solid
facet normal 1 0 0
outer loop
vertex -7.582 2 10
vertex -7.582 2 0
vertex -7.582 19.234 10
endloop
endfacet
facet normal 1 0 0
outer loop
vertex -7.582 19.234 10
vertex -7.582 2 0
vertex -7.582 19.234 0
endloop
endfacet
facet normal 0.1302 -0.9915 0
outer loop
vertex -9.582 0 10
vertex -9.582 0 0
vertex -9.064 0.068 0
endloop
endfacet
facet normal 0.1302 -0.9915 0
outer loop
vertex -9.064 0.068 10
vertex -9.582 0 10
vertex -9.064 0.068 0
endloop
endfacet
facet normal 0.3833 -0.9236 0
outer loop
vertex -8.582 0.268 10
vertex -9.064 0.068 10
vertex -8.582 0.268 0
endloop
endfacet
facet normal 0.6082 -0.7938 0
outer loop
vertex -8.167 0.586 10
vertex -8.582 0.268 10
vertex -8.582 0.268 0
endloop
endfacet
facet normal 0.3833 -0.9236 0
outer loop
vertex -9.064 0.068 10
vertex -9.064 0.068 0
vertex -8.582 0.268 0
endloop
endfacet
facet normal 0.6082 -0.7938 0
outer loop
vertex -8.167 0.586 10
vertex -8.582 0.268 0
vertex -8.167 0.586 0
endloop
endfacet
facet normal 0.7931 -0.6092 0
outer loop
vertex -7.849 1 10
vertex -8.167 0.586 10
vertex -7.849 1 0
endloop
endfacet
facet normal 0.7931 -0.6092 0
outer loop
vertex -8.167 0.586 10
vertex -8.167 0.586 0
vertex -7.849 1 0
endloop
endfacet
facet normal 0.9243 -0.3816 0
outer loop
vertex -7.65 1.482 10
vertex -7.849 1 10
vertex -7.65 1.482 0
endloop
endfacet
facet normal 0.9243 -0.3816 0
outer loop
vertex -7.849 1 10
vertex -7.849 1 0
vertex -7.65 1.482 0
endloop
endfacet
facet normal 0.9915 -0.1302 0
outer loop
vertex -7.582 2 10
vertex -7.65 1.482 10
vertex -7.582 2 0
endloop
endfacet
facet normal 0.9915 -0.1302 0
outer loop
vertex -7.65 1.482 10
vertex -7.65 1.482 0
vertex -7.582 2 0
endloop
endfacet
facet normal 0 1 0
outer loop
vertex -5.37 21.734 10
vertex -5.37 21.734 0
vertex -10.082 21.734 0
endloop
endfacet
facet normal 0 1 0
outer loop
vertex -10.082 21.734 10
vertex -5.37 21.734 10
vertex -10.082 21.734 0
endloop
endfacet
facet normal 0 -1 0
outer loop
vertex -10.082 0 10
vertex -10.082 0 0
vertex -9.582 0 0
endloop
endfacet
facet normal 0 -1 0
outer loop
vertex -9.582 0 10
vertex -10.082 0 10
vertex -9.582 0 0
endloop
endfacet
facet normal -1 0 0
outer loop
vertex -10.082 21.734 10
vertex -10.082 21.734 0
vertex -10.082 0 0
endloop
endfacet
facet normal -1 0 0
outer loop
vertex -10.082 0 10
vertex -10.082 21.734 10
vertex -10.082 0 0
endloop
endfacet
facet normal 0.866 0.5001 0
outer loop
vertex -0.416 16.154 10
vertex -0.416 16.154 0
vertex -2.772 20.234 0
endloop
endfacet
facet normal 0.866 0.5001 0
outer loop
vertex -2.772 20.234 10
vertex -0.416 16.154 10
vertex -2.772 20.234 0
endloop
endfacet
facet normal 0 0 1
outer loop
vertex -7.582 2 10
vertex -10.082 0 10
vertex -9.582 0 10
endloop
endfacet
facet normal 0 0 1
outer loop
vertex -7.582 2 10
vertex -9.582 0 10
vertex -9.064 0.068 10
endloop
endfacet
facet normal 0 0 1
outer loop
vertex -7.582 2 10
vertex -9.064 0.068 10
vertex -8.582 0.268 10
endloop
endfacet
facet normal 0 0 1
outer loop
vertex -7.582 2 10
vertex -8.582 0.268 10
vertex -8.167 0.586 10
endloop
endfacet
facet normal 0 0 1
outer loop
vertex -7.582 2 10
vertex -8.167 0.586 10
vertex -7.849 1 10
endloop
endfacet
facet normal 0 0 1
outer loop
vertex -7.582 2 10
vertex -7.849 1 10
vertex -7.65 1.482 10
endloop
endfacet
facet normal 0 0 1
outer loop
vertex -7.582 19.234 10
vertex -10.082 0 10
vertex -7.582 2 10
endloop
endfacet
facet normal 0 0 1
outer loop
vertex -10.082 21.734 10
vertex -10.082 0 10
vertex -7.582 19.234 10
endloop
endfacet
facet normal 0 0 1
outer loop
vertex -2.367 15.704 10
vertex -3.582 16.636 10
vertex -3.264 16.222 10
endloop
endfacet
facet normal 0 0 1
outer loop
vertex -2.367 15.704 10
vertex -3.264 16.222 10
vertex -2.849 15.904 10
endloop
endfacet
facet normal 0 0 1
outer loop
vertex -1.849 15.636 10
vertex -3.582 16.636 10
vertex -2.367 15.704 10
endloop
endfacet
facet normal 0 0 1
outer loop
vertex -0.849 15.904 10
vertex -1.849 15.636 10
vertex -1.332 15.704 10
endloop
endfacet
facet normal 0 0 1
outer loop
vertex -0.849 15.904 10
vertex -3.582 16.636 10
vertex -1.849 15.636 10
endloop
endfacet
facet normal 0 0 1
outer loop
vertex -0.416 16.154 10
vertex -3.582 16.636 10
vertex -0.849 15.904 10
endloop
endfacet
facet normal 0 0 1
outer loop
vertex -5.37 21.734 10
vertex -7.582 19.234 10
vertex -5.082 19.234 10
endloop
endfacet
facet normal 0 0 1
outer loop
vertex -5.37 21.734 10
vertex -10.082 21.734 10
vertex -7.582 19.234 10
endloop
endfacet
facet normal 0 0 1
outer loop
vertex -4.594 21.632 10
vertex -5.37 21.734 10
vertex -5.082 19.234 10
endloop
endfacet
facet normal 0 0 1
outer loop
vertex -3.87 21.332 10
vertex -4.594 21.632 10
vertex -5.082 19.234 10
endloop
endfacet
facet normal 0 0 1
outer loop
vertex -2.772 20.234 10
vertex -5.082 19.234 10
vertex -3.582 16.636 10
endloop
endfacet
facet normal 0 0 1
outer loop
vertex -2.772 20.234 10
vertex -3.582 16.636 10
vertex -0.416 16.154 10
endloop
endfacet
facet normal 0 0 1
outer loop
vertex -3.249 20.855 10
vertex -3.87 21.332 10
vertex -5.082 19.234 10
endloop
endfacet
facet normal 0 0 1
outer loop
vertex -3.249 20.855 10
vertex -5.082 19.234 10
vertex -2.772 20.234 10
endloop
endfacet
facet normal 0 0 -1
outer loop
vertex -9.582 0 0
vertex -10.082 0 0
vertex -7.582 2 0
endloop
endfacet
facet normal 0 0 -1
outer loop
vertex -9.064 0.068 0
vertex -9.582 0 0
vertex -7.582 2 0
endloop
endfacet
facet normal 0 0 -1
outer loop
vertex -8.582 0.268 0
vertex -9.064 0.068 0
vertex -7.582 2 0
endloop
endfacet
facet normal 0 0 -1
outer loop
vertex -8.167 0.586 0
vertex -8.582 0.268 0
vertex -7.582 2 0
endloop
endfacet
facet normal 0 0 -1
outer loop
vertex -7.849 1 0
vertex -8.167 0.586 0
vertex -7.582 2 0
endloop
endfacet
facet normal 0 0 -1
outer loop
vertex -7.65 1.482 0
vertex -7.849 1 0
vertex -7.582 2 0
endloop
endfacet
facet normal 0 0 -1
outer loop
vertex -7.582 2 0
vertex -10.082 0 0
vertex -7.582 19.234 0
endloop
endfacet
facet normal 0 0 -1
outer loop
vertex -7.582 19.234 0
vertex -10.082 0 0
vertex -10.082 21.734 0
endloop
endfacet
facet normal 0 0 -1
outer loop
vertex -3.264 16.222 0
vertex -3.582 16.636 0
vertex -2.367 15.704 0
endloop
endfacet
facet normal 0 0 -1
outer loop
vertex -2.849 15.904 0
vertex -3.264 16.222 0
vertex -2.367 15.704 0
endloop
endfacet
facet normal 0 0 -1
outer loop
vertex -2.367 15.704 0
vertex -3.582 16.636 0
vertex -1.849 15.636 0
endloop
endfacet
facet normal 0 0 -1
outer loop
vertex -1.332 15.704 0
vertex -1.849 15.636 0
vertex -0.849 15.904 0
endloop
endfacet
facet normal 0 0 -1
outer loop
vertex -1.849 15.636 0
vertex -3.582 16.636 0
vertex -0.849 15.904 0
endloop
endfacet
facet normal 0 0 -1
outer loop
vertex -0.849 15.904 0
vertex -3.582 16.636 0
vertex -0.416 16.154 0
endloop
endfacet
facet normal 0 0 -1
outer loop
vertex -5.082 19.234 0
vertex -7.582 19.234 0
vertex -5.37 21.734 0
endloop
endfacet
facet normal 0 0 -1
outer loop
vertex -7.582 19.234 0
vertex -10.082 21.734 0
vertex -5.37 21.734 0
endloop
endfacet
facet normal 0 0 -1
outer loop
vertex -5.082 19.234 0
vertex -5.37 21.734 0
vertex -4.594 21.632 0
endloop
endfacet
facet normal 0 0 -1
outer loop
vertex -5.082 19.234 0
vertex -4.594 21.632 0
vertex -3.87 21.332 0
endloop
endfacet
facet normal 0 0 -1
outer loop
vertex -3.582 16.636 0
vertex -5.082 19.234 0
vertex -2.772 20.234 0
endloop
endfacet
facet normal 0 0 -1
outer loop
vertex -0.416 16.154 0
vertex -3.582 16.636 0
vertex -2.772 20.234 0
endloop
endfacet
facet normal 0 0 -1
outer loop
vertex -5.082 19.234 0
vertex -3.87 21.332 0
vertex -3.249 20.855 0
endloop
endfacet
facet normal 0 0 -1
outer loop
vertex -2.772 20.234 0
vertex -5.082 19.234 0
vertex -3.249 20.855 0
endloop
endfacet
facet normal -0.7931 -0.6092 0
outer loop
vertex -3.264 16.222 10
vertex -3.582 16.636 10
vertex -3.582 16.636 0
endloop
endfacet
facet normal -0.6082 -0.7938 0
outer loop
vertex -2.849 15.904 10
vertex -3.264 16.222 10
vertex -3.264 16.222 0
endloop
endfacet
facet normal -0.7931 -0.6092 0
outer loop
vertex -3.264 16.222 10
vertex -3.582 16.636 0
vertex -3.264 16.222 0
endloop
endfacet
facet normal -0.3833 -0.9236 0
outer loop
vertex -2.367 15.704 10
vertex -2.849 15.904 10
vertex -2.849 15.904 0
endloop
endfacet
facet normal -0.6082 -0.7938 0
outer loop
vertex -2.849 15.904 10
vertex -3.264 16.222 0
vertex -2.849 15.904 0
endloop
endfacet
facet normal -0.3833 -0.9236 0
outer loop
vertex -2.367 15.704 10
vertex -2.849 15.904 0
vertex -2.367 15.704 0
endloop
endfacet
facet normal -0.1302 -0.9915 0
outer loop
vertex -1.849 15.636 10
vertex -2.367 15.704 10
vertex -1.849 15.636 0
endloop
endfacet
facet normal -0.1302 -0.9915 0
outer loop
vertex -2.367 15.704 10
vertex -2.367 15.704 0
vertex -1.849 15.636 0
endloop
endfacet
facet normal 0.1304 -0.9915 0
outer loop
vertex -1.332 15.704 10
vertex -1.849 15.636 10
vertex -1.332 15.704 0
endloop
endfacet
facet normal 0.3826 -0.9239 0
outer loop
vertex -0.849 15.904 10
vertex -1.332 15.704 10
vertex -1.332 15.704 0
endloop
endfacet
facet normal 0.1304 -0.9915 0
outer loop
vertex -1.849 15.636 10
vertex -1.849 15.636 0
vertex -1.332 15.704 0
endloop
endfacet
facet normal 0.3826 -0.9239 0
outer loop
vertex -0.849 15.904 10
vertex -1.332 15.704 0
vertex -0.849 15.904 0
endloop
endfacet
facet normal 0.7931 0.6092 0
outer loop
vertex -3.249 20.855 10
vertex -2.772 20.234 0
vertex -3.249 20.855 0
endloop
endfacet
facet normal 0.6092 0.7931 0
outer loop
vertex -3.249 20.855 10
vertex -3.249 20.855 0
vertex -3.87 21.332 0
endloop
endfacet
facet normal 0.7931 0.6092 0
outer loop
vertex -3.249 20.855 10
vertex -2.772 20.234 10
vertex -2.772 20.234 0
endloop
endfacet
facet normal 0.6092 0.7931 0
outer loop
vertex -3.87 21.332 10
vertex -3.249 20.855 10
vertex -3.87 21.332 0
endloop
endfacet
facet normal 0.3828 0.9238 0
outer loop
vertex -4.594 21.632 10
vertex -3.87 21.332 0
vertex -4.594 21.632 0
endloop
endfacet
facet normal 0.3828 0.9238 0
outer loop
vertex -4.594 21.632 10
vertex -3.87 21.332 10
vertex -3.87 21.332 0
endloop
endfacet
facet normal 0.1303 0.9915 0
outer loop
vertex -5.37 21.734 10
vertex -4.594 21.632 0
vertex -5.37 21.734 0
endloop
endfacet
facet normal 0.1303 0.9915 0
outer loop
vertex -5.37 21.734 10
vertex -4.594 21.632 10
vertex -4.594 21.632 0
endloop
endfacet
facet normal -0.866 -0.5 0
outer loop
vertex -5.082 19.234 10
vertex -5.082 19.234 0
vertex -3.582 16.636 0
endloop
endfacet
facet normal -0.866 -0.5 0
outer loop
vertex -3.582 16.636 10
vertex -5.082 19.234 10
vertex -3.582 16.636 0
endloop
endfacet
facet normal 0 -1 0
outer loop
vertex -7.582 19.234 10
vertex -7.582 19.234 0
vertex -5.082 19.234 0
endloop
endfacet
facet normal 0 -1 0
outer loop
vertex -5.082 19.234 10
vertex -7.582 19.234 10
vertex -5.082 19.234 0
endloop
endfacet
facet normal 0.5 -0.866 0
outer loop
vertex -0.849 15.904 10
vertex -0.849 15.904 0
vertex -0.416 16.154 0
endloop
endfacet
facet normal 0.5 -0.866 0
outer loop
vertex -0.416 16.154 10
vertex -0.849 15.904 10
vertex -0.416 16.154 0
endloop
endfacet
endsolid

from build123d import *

# Parameters (mm, degrees)
F1_DEPTH = 10
F2_R     = 3


with BuildPart() as f1:
    # F0 (on Top) → F1 (new body)
    with BuildSketch(Plane.XY):
        with BuildLine():
            ThreePointArc((-9.581522, 0), (-8.167308, 0.585786), (-7.581522, 2))
            Line((-7.581522, 2), (-7.581522, 19.23404))
            Line((-7.581522, 19.23404), (-5.081522, 19.23404))
            Line((-5.081522, 19.23404), (-3.581522, 16.635963))
            ThreePointArc((-3.581522, 16.635963), (-2.367109, 15.704112), (-0.849471, 15.903913))
            Line((-0.849471, 15.903913), (-0.416458, 16.153913))
            Line((-0.416458, 16.153913), (-3.638146, 21.73404))
            Line((-3.638146, 21.73404), (-10.081522, 21.73404))
            Line((-10.081522, 21.73404), (-10.081522, 0))
            Line((-10.081522, 0), (-9.581522, 0))
        make_face()
    extrude(amount=F1_DEPTH)

    # F2
    f2_edges = [f1.edges().sort_by_distance(p)[0] for p in [
        (-3.638146, 21.73404, 5),
    ]]
    fillet(f2_edges, radius=F2_R)


solid = f1.part
